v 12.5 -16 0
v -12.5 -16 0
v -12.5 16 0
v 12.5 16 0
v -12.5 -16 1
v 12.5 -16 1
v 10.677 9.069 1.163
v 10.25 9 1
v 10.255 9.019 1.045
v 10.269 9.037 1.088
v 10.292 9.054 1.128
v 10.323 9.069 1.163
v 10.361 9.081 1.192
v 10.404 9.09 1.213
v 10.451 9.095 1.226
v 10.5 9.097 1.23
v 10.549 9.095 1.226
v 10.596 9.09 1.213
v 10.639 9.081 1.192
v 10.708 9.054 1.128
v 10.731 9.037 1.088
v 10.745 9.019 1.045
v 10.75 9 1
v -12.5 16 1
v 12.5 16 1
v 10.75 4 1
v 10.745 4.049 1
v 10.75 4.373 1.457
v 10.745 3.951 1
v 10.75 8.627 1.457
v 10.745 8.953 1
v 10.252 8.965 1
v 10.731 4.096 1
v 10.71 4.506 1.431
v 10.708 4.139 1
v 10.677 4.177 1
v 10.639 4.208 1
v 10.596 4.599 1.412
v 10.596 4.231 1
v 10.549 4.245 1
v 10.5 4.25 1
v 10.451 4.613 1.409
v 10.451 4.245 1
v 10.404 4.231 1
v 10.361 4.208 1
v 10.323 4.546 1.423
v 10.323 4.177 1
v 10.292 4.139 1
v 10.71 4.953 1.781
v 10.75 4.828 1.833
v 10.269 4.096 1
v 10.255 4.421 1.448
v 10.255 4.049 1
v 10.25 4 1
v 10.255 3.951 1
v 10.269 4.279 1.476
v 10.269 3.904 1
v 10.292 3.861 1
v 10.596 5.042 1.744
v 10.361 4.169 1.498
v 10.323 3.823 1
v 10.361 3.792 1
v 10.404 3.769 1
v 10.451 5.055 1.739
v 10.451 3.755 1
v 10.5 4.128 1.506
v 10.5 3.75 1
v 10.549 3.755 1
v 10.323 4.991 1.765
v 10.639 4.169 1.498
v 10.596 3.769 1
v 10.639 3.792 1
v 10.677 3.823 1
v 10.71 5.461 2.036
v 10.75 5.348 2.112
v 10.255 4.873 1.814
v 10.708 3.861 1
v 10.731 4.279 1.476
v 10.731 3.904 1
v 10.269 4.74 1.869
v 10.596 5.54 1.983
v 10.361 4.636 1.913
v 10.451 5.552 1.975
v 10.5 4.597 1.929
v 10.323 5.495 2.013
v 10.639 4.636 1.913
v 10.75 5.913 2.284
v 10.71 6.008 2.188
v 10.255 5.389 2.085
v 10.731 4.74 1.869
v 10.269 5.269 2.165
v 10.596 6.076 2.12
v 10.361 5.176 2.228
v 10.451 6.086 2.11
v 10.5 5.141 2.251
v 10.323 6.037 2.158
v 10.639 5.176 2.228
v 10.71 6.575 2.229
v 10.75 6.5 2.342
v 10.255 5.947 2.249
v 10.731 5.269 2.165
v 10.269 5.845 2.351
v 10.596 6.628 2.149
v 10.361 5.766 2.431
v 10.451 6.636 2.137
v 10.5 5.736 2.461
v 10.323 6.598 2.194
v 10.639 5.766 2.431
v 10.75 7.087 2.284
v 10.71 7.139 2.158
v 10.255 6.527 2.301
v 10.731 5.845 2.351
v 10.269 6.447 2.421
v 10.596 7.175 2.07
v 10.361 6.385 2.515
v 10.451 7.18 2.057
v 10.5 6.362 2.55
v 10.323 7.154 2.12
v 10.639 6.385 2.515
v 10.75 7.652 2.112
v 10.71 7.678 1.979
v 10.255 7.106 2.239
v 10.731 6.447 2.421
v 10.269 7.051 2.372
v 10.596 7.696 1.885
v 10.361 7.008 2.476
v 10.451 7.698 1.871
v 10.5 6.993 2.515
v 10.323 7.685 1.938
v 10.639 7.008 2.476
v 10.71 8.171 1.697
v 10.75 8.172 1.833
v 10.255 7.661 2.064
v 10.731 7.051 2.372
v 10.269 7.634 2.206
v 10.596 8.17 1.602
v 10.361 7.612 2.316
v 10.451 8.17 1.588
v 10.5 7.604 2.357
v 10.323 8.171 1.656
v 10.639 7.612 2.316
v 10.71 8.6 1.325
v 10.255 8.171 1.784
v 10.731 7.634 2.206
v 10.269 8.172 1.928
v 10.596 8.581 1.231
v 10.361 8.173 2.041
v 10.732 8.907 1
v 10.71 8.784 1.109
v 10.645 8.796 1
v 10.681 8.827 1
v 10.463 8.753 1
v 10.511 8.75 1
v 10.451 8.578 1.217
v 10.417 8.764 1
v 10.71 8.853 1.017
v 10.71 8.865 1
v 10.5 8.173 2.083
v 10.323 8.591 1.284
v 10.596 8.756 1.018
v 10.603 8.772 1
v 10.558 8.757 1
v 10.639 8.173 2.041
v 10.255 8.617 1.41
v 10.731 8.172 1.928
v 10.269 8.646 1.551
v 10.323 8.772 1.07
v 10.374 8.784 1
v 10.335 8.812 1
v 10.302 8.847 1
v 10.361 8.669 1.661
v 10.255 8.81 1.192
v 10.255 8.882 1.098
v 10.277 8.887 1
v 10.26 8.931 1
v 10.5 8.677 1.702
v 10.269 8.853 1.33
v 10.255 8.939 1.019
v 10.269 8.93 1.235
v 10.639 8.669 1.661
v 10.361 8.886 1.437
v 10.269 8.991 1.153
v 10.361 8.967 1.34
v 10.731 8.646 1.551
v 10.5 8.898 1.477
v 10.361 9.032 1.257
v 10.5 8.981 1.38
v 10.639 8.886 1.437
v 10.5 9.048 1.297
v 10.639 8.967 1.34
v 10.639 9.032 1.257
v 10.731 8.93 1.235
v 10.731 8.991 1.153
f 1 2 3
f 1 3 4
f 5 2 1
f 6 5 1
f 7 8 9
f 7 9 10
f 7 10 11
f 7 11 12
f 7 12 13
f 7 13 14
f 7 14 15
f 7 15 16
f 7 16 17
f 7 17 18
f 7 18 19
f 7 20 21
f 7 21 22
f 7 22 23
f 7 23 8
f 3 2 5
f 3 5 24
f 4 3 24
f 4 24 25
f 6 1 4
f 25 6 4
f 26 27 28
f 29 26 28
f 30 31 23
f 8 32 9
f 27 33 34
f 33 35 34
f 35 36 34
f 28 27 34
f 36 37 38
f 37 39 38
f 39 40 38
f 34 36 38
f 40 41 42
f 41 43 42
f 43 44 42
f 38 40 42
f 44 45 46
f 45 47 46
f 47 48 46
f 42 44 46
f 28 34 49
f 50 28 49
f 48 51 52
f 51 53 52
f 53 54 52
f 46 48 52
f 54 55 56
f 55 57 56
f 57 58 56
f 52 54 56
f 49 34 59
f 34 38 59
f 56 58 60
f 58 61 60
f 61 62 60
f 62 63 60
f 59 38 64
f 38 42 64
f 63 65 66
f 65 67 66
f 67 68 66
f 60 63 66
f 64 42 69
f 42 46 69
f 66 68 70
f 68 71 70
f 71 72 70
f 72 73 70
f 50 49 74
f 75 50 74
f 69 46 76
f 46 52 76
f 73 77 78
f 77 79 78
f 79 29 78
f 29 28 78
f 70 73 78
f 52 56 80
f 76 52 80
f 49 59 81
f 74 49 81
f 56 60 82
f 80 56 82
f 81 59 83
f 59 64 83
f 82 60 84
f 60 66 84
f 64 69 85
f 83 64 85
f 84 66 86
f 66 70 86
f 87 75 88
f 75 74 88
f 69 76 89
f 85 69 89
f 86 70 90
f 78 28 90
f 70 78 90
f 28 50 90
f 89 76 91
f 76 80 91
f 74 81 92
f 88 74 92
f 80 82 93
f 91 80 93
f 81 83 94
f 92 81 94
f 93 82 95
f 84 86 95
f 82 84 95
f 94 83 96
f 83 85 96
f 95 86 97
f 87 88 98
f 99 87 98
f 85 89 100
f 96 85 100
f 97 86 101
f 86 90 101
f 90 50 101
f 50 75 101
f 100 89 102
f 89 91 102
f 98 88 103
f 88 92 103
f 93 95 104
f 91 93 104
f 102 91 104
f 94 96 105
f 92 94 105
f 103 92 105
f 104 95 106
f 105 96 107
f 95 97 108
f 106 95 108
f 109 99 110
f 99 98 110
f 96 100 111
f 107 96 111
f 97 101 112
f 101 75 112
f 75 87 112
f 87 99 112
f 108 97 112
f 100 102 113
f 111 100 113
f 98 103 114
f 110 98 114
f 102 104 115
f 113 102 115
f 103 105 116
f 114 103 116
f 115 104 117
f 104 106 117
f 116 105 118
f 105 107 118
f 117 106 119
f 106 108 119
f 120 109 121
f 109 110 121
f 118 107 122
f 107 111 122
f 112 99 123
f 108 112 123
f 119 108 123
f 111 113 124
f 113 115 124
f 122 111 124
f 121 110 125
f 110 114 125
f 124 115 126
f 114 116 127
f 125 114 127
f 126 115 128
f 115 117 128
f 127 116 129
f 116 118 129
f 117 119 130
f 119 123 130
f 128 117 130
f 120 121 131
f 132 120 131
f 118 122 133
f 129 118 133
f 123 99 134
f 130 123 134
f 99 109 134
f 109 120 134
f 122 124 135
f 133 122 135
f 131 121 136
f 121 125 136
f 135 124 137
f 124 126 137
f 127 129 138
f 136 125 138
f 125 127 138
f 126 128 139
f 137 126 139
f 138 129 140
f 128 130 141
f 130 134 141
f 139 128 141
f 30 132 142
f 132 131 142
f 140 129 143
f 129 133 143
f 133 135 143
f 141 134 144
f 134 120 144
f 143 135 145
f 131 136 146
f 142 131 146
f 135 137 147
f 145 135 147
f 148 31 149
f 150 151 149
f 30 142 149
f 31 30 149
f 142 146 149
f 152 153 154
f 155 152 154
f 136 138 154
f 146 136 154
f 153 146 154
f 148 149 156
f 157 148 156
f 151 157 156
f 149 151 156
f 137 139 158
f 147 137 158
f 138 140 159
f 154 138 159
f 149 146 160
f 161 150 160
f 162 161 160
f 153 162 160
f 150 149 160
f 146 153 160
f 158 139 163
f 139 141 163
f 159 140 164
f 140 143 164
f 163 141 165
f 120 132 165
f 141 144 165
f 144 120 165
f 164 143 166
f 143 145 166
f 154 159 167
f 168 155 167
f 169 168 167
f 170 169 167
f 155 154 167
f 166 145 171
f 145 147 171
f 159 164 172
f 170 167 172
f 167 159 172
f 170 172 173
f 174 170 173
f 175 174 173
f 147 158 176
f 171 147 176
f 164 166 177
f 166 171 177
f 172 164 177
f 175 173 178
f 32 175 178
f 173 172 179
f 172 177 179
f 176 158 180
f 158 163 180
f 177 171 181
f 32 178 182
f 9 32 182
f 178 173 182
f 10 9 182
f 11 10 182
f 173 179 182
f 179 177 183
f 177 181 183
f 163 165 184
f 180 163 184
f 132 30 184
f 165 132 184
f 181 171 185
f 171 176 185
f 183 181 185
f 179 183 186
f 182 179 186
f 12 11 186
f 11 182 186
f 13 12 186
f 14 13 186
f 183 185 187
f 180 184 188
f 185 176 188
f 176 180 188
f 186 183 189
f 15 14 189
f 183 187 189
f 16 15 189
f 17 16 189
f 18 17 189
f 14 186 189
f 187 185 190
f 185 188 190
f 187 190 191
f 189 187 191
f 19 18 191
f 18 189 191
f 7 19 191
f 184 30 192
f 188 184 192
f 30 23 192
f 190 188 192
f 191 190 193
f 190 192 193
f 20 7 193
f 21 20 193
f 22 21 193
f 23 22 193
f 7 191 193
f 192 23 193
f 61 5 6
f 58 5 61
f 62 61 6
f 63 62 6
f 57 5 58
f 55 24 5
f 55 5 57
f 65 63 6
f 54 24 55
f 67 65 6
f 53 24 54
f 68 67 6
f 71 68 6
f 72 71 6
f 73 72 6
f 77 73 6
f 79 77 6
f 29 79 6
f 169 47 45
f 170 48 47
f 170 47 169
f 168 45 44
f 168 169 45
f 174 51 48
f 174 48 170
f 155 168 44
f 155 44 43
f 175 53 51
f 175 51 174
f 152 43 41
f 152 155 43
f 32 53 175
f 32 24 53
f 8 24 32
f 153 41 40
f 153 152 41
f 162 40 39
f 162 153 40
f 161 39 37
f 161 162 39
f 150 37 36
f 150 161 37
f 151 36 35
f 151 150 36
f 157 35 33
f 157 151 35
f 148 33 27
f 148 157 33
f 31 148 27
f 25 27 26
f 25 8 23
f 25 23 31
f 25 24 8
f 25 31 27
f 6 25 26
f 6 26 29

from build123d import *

# Parameters (mm, degrees)
SKETCH_1_W      = 25
SKETCH_1_H      = 32
EXTRUDE_1_DEPTH = 1
SKETCH_3_R      = 0.25


with BuildPart() as part:
    # 草圖1 → 填料-伸長1 (new body)
    with BuildSketch(Plane.XY):
        Rectangle(SKETCH_1_W, SKETCH_1_H)
    extrude(amount=EXTRUDE_1_DEPTH)

    # 掃出1: sweep along a path in 草圖4
    with BuildLine(Plane(origin=(10.5, 0, 0), x_dir=(0, 0, -1), z_dir=(1, 0, 0))) as sweep_1_path:
        ThreePointArc((-1, 4), (-2.341687605, 6.5), (-1, 9))
    # 草圖3 → 掃出1 (sweep)
    with BuildSketch(Plane.XY.offset(1)):
        with Locations((10.5, 4)):
            Circle(SKETCH_3_R)
    sweep(path=sweep_1_path.line)


solid = part.part
